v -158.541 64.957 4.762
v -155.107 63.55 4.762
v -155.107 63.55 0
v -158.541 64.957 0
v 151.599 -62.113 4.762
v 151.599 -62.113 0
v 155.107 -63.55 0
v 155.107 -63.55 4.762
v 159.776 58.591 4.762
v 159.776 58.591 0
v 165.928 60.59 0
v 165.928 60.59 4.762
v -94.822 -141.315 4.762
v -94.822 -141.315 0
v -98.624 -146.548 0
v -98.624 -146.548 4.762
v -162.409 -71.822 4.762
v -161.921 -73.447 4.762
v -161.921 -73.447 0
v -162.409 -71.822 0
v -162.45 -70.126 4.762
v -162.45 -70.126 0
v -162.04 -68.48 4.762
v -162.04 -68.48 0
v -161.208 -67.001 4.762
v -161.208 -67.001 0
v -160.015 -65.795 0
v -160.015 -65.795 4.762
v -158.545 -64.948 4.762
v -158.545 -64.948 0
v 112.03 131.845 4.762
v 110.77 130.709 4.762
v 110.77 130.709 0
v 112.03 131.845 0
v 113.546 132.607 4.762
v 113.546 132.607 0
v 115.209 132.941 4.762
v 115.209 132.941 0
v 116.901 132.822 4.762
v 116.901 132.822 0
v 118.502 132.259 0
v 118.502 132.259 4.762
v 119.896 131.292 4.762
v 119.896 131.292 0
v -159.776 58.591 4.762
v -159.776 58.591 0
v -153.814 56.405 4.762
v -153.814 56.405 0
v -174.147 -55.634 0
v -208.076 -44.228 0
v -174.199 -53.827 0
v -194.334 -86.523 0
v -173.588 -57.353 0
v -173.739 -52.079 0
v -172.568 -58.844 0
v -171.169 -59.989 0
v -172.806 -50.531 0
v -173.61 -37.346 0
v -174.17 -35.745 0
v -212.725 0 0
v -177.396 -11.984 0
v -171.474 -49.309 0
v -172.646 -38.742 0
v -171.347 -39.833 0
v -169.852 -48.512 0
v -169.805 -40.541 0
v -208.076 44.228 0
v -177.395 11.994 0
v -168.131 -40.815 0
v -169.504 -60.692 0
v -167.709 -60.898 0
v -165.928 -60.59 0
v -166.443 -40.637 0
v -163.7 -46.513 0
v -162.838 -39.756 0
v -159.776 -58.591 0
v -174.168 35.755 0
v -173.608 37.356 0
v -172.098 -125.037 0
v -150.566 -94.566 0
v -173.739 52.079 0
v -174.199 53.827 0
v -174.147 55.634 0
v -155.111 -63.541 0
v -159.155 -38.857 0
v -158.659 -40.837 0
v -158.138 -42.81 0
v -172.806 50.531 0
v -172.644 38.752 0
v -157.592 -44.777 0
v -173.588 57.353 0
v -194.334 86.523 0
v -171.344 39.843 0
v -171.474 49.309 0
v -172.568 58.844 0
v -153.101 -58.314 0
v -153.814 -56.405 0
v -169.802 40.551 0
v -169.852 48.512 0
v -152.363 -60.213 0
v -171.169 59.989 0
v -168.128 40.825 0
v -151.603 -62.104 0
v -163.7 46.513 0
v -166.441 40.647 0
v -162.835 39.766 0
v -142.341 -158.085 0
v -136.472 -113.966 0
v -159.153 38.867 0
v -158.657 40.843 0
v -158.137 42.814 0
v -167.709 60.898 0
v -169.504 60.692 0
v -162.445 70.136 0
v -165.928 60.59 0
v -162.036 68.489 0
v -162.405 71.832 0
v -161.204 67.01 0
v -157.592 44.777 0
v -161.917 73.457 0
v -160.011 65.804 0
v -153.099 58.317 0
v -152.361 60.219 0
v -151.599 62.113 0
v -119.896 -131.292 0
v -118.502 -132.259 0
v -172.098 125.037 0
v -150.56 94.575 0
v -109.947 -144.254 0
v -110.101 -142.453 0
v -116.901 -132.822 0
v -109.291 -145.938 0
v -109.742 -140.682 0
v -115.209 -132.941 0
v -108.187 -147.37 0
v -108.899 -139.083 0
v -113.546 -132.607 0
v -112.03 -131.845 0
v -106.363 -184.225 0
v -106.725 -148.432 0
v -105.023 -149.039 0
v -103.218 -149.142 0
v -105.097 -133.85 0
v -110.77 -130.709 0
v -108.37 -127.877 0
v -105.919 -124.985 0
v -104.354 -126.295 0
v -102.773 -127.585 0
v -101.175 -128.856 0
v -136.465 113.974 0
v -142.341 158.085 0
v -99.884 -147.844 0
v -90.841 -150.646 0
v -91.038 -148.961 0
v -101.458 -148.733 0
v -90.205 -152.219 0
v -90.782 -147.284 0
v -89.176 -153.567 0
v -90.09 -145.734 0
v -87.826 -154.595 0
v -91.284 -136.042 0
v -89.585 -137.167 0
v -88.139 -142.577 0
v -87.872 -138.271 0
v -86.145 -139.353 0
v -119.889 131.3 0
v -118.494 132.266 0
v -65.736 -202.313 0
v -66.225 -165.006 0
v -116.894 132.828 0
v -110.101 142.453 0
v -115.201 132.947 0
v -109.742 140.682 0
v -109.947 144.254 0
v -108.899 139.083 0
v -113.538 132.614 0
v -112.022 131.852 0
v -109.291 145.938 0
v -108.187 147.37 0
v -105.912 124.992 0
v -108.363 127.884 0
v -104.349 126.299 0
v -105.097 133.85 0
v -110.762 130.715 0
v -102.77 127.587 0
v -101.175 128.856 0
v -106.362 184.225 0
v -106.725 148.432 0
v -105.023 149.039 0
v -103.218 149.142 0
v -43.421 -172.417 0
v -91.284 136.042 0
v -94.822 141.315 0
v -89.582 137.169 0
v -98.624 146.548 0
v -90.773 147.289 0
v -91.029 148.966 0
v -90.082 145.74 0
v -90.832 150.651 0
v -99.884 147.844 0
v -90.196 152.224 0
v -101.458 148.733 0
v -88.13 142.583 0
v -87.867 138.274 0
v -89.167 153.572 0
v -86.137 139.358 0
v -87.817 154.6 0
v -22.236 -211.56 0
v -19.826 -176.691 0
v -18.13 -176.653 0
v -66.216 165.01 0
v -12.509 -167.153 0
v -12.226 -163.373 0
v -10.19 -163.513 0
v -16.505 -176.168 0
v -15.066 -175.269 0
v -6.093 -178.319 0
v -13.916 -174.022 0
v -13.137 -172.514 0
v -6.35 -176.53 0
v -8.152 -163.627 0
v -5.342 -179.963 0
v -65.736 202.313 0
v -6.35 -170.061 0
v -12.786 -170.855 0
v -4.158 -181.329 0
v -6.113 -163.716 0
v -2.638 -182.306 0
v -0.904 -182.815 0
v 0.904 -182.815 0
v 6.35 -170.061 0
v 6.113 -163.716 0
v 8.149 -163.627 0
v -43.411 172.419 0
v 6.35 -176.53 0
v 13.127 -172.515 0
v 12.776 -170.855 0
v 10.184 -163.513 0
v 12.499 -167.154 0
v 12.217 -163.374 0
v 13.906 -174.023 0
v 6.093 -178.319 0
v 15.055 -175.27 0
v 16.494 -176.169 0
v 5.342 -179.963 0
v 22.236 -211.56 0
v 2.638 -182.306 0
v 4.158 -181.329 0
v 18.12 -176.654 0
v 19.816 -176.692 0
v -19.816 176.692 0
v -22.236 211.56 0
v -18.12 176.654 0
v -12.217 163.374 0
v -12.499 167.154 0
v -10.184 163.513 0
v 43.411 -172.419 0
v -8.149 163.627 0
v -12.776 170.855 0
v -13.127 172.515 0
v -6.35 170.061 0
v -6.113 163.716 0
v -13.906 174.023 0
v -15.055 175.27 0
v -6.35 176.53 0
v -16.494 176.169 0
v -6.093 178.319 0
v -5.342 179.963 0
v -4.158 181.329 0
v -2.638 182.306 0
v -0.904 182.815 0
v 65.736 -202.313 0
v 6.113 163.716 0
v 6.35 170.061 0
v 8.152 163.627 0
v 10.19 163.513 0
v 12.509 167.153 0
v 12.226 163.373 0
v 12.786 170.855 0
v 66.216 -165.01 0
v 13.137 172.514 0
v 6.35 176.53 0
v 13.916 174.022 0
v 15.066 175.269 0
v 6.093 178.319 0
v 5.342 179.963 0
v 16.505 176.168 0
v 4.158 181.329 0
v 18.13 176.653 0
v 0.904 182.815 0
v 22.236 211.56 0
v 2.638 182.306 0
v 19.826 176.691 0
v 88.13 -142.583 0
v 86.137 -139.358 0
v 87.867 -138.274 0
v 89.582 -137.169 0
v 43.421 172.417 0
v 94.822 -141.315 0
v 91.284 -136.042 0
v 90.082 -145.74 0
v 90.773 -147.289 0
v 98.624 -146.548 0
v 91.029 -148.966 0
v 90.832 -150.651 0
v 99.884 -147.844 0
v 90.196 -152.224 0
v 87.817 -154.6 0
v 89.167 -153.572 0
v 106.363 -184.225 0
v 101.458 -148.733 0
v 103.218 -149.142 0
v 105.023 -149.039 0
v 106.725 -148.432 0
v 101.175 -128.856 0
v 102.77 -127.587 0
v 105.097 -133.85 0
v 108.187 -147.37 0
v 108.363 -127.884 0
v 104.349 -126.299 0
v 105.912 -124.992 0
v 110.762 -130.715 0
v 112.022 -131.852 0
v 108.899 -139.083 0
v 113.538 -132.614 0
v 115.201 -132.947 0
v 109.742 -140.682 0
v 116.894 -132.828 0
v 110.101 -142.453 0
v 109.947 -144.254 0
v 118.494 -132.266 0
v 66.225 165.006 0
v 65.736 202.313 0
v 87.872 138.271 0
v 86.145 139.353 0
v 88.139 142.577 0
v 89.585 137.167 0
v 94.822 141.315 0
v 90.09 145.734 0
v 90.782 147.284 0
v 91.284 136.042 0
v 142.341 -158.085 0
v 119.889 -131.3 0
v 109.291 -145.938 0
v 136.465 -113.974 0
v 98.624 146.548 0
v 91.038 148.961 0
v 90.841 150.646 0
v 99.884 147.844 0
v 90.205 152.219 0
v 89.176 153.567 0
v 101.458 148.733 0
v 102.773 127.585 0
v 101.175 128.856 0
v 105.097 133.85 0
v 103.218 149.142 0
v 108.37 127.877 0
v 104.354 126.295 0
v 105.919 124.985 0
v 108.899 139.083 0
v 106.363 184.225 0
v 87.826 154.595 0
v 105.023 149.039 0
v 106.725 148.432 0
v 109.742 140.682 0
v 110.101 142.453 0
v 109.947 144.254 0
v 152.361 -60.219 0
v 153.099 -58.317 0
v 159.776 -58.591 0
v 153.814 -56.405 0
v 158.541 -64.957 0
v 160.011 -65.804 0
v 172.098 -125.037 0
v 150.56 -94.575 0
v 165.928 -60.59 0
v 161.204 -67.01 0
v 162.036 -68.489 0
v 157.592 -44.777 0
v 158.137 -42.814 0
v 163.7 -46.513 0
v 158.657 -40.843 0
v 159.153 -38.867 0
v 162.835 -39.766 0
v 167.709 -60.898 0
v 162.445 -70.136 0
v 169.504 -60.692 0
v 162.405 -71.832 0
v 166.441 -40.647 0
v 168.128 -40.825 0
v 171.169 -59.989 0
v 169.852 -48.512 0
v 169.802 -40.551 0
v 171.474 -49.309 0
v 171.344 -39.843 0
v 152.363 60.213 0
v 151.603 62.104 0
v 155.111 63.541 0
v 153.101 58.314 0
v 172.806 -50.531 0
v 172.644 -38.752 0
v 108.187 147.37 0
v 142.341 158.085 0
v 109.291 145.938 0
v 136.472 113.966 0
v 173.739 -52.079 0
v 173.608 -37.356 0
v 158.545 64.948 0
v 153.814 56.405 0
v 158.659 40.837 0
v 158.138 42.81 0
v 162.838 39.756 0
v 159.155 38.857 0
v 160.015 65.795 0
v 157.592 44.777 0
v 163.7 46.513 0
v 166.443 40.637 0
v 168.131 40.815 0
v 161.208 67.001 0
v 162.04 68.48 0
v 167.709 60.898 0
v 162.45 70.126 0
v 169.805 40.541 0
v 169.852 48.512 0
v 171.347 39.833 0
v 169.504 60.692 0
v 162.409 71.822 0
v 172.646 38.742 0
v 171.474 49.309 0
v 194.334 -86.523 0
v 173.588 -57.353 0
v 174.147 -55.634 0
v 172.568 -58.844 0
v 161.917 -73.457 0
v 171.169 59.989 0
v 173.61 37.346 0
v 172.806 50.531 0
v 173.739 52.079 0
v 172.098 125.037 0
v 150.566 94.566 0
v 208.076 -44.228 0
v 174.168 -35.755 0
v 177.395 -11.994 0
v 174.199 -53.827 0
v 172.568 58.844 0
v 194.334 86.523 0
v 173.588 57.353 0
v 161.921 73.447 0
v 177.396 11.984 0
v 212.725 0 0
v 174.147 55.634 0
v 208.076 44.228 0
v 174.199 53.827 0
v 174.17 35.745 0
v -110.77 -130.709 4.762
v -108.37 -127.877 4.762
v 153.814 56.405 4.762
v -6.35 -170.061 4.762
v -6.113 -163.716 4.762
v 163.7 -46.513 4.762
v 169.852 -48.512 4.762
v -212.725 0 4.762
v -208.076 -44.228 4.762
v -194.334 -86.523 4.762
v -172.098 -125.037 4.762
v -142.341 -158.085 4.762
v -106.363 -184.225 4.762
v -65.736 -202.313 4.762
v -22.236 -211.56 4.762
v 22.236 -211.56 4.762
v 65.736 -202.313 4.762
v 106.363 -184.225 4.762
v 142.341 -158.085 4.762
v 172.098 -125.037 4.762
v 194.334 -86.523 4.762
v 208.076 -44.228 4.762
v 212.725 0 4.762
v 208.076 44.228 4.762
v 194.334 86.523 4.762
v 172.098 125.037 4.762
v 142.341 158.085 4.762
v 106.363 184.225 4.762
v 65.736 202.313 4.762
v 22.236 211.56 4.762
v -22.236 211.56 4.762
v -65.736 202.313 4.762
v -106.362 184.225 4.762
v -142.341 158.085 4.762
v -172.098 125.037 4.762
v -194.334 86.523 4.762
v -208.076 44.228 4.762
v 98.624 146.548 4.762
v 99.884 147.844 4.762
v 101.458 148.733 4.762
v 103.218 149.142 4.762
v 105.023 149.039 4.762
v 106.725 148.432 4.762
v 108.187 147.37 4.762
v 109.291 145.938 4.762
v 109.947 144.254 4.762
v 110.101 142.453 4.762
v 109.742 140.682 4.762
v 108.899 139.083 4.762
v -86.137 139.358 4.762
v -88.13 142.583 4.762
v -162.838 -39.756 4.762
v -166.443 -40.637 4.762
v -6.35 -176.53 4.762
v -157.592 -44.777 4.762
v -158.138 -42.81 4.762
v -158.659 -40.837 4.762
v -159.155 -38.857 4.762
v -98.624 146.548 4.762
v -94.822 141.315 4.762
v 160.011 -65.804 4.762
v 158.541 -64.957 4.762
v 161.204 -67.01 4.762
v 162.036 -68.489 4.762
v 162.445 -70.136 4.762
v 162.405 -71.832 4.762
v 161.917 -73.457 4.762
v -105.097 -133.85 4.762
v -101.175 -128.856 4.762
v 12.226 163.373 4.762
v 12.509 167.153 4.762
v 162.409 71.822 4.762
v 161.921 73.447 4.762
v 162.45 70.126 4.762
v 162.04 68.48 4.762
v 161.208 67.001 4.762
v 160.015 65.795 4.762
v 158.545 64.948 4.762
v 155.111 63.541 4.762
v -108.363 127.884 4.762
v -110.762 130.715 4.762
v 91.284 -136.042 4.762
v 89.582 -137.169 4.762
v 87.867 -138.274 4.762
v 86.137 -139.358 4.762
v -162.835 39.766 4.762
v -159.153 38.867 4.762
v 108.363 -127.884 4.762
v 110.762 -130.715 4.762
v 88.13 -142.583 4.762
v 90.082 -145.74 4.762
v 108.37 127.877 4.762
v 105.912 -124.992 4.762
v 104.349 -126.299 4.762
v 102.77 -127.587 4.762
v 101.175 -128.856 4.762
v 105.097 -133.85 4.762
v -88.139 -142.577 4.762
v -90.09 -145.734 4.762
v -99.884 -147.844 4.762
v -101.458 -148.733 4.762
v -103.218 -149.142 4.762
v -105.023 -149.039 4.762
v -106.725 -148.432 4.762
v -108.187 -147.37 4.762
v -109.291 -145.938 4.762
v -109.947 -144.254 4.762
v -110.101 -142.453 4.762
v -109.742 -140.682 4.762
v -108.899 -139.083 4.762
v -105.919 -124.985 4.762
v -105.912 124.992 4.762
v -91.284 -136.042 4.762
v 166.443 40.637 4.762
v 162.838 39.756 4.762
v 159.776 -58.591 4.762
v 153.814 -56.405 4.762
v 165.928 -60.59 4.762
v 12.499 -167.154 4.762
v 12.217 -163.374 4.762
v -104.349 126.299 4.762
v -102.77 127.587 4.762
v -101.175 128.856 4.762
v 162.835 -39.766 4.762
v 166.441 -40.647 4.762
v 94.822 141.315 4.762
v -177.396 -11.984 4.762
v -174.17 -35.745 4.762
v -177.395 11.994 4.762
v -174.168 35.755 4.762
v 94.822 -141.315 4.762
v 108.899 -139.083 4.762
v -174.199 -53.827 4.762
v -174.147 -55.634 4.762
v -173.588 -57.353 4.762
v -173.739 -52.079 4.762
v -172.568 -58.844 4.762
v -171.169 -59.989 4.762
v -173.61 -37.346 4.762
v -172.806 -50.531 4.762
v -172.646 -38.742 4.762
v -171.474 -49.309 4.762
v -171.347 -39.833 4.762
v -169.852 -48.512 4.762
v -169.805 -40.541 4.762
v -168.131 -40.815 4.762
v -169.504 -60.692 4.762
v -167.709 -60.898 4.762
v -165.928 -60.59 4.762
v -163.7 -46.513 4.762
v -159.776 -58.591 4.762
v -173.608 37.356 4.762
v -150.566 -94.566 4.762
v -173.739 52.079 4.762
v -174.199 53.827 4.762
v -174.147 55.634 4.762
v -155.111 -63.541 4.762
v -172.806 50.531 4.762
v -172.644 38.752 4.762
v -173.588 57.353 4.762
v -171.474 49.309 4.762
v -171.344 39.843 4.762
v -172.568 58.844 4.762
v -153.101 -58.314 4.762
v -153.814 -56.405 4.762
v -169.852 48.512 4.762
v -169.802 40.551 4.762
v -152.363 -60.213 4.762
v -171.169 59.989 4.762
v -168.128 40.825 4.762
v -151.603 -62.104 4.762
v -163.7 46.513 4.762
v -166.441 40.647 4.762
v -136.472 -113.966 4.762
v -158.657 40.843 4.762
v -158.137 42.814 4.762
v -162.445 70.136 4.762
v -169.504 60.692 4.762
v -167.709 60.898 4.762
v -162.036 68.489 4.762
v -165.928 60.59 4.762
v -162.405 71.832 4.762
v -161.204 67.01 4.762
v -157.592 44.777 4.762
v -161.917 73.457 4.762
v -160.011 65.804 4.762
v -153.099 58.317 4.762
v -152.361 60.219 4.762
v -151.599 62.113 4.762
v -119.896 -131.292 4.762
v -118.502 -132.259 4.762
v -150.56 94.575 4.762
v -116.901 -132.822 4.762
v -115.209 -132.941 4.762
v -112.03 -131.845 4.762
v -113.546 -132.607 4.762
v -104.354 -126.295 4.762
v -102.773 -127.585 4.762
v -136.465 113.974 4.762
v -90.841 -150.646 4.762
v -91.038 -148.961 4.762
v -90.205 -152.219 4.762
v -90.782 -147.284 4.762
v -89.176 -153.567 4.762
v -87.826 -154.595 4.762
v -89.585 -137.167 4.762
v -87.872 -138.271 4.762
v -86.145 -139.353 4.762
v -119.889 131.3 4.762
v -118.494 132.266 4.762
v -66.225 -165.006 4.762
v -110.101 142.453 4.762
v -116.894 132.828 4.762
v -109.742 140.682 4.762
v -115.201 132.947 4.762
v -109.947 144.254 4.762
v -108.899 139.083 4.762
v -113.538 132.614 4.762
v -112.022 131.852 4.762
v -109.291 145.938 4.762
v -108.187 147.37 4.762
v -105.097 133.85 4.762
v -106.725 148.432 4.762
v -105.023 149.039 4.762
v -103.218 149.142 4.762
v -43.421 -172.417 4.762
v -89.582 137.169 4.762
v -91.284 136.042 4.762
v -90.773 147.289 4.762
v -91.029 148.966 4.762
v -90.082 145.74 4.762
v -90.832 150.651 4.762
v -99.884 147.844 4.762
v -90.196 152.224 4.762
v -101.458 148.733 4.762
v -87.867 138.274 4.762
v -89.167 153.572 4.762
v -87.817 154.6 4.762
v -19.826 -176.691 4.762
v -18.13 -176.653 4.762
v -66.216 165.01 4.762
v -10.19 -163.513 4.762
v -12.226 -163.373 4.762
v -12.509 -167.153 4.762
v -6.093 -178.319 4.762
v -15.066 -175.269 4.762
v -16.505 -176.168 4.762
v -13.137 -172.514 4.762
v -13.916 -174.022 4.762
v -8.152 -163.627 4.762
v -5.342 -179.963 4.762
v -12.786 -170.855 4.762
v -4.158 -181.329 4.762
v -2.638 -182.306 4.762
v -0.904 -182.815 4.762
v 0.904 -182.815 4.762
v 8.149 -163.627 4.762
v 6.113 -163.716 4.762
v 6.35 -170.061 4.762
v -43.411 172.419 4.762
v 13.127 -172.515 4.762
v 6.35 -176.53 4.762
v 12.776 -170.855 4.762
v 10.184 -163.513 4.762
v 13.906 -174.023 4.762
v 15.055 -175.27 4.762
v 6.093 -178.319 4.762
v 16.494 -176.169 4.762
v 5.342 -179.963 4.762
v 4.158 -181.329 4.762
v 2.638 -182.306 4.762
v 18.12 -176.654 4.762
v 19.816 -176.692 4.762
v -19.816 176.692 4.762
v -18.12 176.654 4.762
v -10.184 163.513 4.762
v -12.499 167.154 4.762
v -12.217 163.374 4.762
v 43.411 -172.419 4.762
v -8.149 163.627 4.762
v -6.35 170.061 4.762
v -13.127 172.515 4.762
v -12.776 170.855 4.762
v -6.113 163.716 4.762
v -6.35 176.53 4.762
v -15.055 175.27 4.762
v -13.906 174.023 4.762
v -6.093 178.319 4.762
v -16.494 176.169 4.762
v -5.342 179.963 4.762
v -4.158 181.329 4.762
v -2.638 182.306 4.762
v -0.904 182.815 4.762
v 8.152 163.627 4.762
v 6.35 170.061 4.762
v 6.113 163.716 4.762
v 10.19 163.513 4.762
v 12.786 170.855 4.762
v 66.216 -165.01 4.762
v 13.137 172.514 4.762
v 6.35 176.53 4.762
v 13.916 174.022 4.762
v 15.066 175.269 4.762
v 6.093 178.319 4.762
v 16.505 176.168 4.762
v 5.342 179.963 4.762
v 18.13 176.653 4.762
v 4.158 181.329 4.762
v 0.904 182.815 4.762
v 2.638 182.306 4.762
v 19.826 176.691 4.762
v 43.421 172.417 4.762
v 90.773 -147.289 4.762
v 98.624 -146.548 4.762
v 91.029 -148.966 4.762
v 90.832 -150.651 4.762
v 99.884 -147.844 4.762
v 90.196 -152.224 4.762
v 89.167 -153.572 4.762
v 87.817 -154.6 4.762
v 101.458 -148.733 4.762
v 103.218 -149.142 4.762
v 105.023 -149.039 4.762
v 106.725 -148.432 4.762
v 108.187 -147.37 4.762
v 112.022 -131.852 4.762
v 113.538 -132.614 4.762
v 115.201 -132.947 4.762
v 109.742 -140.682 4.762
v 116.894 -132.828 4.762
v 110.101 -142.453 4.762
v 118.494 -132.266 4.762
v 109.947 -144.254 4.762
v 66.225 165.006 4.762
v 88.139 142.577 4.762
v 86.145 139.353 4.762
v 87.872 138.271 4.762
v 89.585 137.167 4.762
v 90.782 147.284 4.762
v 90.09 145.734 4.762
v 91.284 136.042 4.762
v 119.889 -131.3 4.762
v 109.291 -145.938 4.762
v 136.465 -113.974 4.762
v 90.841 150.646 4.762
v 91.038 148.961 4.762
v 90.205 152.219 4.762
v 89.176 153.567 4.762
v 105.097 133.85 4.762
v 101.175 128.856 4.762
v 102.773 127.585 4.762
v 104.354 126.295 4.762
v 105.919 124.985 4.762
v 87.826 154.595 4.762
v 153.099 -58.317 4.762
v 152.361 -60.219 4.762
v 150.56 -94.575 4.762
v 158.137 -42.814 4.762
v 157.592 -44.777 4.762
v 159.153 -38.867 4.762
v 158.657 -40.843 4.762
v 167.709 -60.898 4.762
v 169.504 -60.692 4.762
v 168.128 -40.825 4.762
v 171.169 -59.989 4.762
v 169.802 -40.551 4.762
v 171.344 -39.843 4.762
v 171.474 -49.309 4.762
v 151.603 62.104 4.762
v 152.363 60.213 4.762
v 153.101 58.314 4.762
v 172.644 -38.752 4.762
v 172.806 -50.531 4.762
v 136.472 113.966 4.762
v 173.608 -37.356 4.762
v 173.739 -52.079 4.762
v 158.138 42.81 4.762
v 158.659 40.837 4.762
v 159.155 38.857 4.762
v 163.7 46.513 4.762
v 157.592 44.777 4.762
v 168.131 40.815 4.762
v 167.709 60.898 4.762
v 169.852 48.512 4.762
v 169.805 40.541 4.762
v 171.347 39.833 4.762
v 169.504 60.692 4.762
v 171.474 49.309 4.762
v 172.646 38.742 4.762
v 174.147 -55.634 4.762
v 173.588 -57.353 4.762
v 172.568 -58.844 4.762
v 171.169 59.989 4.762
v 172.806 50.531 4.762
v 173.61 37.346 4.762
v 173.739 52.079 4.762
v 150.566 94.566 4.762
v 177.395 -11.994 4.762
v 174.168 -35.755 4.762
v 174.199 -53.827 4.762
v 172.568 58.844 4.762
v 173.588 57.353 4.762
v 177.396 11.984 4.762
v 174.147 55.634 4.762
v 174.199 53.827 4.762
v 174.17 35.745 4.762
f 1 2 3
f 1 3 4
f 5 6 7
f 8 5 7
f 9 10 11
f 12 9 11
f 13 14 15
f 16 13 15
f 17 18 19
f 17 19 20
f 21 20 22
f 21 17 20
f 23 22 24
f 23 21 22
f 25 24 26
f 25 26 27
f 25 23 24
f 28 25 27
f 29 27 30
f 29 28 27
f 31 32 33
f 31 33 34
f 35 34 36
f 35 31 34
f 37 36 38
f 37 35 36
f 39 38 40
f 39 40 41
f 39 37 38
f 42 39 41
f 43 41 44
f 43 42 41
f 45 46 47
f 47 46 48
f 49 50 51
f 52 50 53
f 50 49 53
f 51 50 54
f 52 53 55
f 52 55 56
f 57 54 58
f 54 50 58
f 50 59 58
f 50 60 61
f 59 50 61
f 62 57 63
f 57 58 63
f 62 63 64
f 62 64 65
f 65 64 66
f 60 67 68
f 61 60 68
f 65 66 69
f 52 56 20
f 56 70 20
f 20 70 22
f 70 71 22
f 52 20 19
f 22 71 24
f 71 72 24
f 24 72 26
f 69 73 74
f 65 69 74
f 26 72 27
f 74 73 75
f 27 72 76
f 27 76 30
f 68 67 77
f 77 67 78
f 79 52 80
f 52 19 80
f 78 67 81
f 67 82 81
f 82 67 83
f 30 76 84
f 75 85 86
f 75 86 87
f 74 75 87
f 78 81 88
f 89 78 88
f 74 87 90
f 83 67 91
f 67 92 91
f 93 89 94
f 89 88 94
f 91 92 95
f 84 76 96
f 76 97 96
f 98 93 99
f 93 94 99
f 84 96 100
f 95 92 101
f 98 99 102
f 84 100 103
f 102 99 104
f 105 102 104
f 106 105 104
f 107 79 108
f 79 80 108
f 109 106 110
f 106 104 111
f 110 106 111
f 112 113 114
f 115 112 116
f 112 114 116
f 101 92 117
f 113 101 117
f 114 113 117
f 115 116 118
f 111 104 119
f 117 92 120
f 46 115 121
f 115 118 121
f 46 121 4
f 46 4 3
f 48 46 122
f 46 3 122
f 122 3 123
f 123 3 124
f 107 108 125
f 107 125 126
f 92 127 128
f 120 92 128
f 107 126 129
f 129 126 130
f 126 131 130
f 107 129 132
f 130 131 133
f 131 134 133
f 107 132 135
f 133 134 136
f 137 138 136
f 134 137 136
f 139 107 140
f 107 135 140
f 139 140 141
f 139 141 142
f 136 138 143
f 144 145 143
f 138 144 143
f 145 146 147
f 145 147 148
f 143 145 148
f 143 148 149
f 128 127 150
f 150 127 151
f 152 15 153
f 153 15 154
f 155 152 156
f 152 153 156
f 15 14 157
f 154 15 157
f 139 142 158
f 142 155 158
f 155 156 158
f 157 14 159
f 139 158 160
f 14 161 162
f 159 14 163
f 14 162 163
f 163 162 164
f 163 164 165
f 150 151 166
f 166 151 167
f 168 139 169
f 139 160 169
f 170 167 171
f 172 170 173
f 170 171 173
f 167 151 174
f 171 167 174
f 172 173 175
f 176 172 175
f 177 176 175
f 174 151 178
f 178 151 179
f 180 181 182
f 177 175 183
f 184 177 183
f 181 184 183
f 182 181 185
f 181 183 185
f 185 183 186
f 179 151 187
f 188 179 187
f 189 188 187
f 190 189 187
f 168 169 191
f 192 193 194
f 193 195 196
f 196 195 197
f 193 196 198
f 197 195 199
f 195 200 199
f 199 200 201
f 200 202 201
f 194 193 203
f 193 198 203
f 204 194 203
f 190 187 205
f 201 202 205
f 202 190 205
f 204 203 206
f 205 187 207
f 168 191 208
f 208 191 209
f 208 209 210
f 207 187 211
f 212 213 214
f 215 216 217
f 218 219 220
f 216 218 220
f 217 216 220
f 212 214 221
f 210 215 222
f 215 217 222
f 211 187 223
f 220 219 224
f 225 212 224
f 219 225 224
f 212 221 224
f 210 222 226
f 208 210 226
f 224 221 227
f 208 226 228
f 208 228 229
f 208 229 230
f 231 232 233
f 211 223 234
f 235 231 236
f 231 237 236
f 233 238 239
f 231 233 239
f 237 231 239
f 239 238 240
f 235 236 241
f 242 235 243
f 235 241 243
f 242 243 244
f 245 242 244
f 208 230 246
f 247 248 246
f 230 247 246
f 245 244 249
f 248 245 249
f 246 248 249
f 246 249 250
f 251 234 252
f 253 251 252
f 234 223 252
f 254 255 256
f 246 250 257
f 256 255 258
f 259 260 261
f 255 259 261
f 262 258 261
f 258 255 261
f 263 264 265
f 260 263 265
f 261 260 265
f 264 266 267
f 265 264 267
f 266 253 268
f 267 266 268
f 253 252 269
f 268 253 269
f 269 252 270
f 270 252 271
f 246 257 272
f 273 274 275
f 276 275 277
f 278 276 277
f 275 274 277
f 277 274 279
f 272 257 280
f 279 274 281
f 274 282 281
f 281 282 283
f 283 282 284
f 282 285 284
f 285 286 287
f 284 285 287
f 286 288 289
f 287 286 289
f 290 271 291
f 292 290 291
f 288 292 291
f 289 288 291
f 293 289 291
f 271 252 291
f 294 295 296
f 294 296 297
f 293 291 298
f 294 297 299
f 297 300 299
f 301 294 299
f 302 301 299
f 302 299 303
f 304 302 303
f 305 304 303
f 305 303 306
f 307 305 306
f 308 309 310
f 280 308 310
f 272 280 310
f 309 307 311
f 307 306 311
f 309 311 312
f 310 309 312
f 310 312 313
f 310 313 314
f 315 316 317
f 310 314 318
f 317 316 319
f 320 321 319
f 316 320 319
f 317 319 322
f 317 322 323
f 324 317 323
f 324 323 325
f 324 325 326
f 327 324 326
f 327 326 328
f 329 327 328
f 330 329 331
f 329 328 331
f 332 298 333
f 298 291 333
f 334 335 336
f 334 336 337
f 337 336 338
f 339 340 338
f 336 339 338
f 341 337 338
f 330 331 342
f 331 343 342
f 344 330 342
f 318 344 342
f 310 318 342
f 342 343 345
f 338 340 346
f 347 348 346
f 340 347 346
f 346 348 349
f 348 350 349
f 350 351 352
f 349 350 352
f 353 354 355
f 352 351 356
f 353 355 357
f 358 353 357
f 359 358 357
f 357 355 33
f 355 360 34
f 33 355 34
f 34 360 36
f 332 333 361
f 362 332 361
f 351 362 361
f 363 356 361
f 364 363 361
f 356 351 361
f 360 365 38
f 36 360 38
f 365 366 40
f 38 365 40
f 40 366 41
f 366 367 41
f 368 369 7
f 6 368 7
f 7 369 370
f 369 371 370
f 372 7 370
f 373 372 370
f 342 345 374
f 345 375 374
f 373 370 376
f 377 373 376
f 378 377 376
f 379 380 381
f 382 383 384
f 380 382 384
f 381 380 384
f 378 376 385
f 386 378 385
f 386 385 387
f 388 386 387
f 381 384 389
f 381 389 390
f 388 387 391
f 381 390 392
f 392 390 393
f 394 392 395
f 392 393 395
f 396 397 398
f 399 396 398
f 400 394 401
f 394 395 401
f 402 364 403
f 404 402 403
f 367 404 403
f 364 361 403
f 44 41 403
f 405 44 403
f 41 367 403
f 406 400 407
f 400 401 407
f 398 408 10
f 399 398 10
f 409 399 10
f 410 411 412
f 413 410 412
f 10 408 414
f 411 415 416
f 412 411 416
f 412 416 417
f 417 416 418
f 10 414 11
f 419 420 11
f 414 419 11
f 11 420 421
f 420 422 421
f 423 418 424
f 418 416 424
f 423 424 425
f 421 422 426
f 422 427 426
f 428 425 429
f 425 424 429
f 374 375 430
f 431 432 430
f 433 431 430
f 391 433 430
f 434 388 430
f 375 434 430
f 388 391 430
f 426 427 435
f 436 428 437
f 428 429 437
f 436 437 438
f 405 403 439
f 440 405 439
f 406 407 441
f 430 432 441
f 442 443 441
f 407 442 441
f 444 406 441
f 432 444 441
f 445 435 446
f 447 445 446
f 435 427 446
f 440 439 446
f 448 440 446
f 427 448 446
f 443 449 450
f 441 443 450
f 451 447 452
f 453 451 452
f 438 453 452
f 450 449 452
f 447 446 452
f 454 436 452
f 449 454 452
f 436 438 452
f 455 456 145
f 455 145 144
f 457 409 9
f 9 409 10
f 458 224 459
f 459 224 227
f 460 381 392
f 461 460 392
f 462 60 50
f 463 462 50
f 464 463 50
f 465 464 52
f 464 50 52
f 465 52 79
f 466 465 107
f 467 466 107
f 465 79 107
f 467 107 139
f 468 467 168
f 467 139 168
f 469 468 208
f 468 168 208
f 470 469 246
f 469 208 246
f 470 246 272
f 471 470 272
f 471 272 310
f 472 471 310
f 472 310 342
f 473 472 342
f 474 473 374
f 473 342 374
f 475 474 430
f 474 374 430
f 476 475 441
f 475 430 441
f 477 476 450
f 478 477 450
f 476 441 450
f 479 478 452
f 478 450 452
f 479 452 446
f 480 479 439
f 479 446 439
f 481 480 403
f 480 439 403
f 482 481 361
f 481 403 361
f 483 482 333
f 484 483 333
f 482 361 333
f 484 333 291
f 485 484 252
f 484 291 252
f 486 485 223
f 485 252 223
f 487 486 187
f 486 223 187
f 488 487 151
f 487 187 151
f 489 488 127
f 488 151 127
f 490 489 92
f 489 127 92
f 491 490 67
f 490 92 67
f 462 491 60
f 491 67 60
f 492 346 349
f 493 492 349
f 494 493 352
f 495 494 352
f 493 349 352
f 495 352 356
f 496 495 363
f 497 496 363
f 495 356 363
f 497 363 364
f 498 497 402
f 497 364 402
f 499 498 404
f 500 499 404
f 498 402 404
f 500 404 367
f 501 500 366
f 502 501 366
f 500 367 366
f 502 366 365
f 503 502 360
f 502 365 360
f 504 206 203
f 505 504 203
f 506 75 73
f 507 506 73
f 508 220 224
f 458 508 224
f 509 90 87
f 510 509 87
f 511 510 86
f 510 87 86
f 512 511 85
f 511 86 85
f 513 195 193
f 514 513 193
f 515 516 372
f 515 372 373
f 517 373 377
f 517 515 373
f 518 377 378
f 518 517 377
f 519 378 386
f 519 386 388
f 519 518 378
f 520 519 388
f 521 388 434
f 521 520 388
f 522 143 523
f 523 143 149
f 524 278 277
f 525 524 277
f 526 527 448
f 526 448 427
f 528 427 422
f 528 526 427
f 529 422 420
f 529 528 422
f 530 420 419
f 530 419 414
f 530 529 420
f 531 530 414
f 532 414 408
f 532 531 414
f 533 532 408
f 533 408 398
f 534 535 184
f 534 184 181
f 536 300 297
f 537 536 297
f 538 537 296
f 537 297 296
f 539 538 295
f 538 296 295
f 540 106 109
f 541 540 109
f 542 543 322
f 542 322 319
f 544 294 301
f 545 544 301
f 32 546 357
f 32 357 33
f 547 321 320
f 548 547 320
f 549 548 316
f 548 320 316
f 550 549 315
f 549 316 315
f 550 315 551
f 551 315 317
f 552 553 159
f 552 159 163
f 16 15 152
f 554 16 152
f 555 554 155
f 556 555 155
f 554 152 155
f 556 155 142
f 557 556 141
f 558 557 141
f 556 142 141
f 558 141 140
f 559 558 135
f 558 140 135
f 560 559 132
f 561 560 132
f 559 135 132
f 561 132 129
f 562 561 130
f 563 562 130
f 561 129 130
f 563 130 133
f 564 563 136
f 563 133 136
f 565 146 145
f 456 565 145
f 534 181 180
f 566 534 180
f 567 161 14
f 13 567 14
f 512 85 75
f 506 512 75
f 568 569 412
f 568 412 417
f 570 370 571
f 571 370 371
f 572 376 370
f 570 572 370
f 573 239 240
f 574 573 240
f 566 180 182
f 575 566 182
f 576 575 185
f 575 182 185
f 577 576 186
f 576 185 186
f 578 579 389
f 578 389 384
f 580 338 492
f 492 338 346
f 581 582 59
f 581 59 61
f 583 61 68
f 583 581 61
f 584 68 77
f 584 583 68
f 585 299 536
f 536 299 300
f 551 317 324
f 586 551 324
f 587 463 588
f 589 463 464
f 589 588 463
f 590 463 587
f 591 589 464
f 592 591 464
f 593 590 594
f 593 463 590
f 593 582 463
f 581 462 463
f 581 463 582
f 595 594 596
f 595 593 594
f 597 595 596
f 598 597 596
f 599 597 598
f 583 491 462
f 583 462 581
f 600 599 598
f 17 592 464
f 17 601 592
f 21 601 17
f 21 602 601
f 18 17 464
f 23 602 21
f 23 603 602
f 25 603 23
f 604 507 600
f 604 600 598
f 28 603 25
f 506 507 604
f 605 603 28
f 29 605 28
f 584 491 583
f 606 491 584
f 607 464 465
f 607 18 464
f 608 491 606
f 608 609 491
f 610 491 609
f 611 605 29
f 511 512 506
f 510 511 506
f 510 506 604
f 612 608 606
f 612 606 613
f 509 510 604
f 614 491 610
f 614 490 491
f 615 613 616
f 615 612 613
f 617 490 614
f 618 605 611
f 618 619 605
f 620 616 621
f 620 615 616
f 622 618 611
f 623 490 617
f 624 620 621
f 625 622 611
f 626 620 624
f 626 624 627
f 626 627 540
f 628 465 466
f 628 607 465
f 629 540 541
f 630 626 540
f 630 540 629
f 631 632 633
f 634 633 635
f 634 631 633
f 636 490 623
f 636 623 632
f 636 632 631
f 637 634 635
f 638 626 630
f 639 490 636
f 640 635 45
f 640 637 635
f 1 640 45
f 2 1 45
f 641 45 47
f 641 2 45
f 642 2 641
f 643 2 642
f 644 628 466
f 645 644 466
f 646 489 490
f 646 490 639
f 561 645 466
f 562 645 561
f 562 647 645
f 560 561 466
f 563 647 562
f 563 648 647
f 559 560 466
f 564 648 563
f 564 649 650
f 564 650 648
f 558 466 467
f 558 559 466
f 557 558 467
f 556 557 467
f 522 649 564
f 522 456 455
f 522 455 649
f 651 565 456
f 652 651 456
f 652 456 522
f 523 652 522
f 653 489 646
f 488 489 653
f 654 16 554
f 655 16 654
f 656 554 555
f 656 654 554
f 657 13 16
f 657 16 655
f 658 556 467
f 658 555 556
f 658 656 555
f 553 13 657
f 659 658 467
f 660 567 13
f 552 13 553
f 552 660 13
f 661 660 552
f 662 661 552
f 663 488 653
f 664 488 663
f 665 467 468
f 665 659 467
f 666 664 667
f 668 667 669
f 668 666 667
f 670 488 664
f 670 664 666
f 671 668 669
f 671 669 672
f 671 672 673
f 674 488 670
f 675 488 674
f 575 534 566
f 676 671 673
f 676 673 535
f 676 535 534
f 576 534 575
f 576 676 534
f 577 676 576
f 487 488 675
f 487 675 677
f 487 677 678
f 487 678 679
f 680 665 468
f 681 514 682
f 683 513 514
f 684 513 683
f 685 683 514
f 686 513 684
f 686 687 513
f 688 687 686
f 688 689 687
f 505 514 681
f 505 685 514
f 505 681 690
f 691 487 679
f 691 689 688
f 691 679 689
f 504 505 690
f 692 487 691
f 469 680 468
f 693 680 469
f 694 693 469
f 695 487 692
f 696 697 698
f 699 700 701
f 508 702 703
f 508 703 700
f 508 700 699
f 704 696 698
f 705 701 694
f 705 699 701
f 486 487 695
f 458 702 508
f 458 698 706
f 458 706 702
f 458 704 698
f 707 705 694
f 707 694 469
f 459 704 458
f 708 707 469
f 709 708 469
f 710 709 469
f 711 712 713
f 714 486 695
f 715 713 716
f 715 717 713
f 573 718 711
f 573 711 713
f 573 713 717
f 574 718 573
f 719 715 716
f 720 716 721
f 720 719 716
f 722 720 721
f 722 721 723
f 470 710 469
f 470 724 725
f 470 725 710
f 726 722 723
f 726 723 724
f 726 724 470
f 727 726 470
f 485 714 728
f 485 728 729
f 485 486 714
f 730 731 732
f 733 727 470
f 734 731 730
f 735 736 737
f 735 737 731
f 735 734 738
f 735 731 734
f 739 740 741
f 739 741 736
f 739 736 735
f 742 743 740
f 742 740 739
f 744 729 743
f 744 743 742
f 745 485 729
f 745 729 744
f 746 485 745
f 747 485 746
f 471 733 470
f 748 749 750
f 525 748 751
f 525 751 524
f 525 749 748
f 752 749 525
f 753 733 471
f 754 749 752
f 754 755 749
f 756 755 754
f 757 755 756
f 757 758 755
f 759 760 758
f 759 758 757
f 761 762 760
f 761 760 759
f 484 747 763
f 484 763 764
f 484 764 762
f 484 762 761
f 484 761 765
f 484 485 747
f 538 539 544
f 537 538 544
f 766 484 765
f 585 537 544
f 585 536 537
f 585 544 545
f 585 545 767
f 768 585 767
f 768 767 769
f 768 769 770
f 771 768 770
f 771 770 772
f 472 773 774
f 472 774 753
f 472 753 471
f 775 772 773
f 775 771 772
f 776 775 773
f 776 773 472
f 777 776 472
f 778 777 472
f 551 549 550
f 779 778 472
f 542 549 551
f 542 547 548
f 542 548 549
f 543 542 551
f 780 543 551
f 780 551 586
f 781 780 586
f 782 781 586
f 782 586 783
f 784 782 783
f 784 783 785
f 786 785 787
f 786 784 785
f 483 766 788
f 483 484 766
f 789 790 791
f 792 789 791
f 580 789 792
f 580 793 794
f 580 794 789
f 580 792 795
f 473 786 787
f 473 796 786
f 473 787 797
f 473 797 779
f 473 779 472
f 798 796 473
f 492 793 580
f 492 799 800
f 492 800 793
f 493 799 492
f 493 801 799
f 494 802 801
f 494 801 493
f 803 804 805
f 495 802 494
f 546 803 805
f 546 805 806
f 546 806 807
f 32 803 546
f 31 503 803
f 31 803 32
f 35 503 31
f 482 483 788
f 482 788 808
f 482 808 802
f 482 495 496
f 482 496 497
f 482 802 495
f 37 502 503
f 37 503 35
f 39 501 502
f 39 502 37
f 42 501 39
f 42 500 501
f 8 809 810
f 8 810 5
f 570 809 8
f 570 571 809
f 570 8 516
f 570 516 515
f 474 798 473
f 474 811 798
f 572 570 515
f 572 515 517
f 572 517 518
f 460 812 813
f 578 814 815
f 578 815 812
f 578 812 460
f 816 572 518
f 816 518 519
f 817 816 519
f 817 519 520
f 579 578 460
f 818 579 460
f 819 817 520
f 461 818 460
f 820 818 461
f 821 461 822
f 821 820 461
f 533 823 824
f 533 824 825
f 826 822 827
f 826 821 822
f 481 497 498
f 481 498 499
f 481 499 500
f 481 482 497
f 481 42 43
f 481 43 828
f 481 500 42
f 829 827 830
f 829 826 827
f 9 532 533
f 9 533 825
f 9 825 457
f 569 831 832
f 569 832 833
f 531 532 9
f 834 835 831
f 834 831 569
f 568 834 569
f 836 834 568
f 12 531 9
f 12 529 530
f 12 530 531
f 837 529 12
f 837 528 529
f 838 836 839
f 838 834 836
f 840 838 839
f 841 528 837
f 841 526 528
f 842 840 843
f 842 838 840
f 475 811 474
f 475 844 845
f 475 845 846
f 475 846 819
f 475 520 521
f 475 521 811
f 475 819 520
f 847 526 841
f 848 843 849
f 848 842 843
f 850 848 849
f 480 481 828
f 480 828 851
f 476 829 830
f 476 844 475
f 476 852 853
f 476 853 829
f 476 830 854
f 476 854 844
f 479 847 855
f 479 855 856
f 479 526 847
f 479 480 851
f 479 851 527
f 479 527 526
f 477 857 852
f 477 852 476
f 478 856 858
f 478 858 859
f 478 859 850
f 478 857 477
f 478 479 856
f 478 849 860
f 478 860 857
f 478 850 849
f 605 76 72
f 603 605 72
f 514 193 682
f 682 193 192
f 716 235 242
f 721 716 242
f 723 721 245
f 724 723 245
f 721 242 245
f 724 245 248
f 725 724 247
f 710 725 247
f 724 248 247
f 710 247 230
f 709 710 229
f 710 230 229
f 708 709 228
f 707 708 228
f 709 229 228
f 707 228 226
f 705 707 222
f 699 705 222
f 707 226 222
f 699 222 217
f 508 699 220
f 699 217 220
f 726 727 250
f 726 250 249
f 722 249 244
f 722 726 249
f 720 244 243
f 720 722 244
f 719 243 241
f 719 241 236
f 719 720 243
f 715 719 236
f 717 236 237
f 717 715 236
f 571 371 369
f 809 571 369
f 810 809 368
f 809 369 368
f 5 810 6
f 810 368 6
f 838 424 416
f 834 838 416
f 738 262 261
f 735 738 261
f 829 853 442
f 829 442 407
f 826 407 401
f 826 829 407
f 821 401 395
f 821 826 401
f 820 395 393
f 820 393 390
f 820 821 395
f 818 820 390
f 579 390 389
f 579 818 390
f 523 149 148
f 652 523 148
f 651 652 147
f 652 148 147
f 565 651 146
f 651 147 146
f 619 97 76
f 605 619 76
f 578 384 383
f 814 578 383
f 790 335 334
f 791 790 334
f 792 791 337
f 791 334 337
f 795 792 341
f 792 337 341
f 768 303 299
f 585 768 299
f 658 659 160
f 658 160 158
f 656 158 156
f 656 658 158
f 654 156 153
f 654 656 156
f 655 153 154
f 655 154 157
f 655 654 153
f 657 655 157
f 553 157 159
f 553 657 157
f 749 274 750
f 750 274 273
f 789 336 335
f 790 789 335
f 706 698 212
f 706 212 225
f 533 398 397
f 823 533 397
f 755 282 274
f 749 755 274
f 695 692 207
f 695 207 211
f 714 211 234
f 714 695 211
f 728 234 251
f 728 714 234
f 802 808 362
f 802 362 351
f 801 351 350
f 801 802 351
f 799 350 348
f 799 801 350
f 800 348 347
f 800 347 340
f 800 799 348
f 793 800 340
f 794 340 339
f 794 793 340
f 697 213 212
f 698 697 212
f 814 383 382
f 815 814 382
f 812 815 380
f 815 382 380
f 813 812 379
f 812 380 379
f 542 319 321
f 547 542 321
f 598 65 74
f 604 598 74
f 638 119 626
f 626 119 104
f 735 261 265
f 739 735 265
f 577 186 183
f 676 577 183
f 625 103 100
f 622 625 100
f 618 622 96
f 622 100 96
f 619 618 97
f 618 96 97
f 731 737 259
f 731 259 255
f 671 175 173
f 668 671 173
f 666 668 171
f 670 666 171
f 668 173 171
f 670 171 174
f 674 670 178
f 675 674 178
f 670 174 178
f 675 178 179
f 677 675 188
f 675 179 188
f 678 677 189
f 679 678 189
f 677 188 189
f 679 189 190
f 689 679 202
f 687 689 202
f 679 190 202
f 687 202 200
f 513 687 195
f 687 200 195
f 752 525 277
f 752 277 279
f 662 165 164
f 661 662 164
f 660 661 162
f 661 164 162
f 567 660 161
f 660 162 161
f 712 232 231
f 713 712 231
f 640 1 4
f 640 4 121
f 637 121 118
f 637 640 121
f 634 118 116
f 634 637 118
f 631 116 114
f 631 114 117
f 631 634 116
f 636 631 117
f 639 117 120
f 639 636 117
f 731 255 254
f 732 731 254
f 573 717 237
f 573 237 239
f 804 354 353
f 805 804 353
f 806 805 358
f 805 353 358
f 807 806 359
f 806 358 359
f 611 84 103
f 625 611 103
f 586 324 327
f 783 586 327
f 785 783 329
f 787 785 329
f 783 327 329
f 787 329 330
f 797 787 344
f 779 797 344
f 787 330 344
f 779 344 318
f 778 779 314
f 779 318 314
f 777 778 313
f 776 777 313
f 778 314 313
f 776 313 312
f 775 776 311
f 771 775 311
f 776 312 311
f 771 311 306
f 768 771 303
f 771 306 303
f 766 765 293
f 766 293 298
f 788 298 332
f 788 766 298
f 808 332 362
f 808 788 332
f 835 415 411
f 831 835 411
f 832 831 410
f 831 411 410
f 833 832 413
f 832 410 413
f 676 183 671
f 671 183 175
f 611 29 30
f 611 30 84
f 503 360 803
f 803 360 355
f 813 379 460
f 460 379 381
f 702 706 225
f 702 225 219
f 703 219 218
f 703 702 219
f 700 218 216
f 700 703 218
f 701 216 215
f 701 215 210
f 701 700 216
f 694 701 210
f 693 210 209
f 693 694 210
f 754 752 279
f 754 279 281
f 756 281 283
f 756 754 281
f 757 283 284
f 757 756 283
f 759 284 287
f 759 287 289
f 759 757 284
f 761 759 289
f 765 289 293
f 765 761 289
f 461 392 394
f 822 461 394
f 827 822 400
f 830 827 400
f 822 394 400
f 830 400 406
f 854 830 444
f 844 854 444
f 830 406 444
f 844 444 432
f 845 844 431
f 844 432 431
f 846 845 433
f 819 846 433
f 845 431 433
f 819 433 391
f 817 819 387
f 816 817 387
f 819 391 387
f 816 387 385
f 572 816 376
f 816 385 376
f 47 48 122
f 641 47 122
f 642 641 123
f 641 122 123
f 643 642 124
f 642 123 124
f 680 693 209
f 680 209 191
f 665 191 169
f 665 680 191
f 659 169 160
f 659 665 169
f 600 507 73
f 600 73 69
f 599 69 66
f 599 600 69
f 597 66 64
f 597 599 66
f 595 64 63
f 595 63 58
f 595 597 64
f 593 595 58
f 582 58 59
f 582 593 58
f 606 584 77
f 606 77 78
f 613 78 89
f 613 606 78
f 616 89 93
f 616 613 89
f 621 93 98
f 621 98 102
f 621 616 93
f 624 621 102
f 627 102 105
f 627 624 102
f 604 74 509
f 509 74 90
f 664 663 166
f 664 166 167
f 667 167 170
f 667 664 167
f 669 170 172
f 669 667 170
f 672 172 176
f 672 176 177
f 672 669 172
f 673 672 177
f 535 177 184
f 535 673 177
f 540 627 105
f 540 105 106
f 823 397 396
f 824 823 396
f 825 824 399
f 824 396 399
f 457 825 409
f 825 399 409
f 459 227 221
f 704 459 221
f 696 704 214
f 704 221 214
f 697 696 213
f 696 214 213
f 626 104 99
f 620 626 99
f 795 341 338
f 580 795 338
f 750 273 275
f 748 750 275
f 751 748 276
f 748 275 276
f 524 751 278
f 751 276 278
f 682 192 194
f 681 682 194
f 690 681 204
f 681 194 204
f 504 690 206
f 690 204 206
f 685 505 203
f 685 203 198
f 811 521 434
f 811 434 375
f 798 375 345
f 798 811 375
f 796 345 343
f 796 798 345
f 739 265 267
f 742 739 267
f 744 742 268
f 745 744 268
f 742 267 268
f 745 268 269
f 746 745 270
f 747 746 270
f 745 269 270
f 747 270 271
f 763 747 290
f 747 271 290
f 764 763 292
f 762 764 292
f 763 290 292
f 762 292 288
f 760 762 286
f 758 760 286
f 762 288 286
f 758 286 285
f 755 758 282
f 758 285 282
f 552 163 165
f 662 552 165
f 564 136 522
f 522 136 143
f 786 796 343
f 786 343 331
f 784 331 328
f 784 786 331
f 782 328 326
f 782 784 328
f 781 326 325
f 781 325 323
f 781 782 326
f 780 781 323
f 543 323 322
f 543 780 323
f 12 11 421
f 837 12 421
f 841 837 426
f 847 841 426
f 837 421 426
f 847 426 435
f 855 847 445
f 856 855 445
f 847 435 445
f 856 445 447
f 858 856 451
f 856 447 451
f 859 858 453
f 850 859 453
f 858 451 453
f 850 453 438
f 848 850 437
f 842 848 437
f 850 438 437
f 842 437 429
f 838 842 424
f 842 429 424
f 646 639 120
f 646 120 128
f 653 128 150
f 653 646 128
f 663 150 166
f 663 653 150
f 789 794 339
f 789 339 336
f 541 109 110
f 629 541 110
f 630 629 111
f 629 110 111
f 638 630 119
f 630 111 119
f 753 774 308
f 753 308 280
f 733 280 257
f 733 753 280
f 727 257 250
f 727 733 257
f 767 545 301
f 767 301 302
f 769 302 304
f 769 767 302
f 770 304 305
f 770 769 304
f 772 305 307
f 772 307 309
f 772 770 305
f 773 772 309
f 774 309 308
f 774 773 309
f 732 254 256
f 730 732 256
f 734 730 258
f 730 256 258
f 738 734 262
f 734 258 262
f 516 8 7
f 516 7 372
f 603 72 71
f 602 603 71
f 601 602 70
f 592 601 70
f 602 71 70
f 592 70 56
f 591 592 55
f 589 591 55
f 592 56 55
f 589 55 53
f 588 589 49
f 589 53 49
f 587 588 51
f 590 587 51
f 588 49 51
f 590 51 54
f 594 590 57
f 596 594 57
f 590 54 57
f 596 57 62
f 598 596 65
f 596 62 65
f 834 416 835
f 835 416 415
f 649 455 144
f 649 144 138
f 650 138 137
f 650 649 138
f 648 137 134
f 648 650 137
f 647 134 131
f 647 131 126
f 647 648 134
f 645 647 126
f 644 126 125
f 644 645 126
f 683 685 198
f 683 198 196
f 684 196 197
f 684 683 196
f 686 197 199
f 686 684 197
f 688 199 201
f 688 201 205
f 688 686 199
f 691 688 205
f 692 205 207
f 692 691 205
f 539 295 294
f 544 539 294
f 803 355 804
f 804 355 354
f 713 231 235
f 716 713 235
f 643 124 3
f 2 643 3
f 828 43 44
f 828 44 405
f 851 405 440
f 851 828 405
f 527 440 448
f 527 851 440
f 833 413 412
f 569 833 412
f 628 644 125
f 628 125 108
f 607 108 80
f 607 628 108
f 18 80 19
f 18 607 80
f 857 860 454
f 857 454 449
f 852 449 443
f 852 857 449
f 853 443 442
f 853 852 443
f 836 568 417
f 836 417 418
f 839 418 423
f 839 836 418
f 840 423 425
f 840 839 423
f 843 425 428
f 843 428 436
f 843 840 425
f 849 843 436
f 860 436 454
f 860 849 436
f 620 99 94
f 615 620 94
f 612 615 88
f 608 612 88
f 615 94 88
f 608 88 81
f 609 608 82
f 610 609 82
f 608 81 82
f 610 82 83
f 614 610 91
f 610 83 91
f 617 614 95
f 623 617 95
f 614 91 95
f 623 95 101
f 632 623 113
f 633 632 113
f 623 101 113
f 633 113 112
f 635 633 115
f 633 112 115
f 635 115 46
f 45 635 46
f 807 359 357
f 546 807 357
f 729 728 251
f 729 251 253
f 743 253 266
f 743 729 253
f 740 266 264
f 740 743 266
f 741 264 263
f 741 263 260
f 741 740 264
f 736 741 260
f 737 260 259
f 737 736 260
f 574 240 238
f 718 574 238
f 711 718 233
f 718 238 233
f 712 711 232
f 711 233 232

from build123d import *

# Parameters (mm, degrees)
SKETCH1_R           = 212.725
BOSS_EXTRUDE1_DEPTH = 4.7625
SKETCH8_R           = 170.18
CUT_EXTRUDE1_DEPTH  = 4.7625
CUT_EXTRUDE3_DEPTH  = 4.7625
CIRPATTERN1_COUNT   = 10
BOSS_EXTRUDE2_START = -4.7625
BOSS_EXTRUDE2_DEPTH = 4.7625
CIRPATTERN2_COUNT   = 10
CUT_EXTRUDE4_DEPTH  = 4.7625
CIRPATTERN3_COUNT   = 10


with BuildPart() as part:
    # Sketch1 → Boss-Extrude1 (new body)
    with BuildSketch(Plane.XY):
        with Locations(Location((0, 0, 0), (0, 0, 180))):
            Circle(SKETCH1_R)
    extrude(amount=BOSS_EXTRUDE1_DEPTH)

    # Sketch8 → Cut-Extrude1 (cut)
    with BuildSketch(Plane(origin=(0, 0, 0), x_dir=(-1, 0, 0), z_dir=(0, 0, -1))):
        Circle(SKETCH8_R)
    extrude(amount=-CUT_EXTRUDE1_DEPTH, mode=Mode.SUBTRACT)

    # Sketch9 → Cut-Extrude3 (cut)
    with BuildSketch(Plane(origin=(0, 0, 0), x_dir=(-1, 0, 0), z_dir=(0, 0, -1))):
        with BuildLine():
            ThreePointArc((6.35, 176.53), (0, 182.88), (-6.35, 176.53))
            Line((-6.35, 176.53), (6.35, 176.53))
        make_face()
        with BuildLine():
            Line((6.35, 176.53), (-6.35, 176.53))
            ThreePointArc((-6.35, 176.53), (-4.490128114, 172.039871993), (-1.51e-07, 170.18))
            ThreePointArc((-1.51e-07, 170.18), (4.490128007, 172.039871886), (6.35, 176.53))
        make_face()
        with BuildLine():
            ThreePointArc((-1.51e-07, 170.18), (3.175552827, 170.150369568), (6.35, 170.061488586))
            Line((6.35, 170.061488586), (6.35, 176.53))
            ThreePointArc((6.35, 176.53), (4.490128007, 172.039871886), (-1.51e-07, 170.18))
        make_face()
        with BuildLine():
            Line((-6.35, 176.53), (-6.35, 170.061488586))
            ThreePointArc((-6.35, 170.061488586), (-3.175552978, 170.150369566), (-1.51e-07, 170.18))
            ThreePointArc((-1.51e-07, 170.18), (-4.490128114, 172.039871993), (-6.35, 176.53))
        make_face()
    cut_extrude3 = extrude(amount=-CUT_EXTRUDE3_DEPTH, mode=Mode.SUBTRACT)

    # CirPattern1: Cut-Extrude3 ×10 about axis
    cirpattern1_axis = Axis((0, 0, 0), (0, 0, 1))
    for i in range(1, CIRPATTERN1_COUNT):
        add(cut_extrude3.rotate(cirpattern1_axis, i * 360 / CIRPATTERN1_COUNT), mode=Mode.SUBTRACT)

    # Sketch11 → Boss-Extrude2 (add)
    with BuildSketch(Plane.XY.offset(4.7625).offset(BOSS_EXTRUDE2_START)):
        with BuildLine():
            Line((-12.499214211, 167.15408354), (-12.216543508, 163.373880913))
            ThreePointArc((-12.216543508, 163.373880913), (-9.166397031, 163.573366003), (-6.113059701, 163.715910653))
            Line((-6.113059701, 163.715910653), (-6.35, 170.061488586))
            ThreePointArc((-6.35, 170.061488586), (-10.808670296, 169.836406717), (-15.259902334, 169.49444764))
            ThreePointArc((-15.259902334, 169.49444764), (-13.389651606, 168.902158369), (-12.499214211, 167.15408354))
        make_face()
        with BuildLine():
            ThreePointArc((15.269836972, 169.493552912), (10.813647646, 169.836089877), (6.35, 170.061488586))
            Line((6.35, 170.061488586), (6.113059701, 163.715910653))
            ThreePointArc((6.113059701, 163.715910653), (9.171190832, 163.573097295), (12.226119403, 163.373164578))
            Line((12.226119403, 163.373164578), (12.509011677, 167.15335063))
            ThreePointArc((12.509011677, 167.15335063), (13.399551531, 168.901373265), (15.269836972, 169.493552912))
        make_face()
    boss_extrude2 = extrude(amount=BOSS_EXTRUDE2_DEPTH)

    # CirPattern2: Boss-Extrude2 ×10 about axis
    cirpattern2_axis = Axis((0, 0, 0), (0, 0, 1))
    for i in range(1, CIRPATTERN2_COUNT):
        add(boss_extrude2.rotate(cirpattern2_axis, i * 360 / CIRPATTERN2_COUNT))

    # Sketch17 → Cut-Extrude4 (cut)
    with BuildSketch(Plane.XY.offset(4.7625)):
        with BuildLine():
            Line((0, 0), (110.76991022, 130.708863471))
            ThreePointArc((110.76991022, 130.708863471), (115.209063959, 132.940513661), (119.896314229, 131.292474401))
            ThreePointArc((119.896314229, 131.292474401), (143.846284335, 104.504002235), (161.920867248, 73.44707448))
            ThreePointArc((161.920867248, 73.44707448), (162.039514595, 68.479955466), (158.545108161, 64.947892023))
            Line((158.545108161, 64.947892023), (0, 0))
        make_face()
    cut_extrude4 = extrude(amount=-CUT_EXTRUDE4_DEPTH, mode=Mode.SUBTRACT)

    # CirPattern3: Cut-Extrude4 ×10 about axis
    cirpattern3_axis = Axis((0, 0, 0), (0, 0, 1))
    for i in range(1, CIRPATTERN3_COUNT):
        add(cut_extrude4.rotate(cirpattern3_axis, i * 360 / CIRPATTERN3_COUNT), mode=Mode.SUBTRACT)


solid = part.part
